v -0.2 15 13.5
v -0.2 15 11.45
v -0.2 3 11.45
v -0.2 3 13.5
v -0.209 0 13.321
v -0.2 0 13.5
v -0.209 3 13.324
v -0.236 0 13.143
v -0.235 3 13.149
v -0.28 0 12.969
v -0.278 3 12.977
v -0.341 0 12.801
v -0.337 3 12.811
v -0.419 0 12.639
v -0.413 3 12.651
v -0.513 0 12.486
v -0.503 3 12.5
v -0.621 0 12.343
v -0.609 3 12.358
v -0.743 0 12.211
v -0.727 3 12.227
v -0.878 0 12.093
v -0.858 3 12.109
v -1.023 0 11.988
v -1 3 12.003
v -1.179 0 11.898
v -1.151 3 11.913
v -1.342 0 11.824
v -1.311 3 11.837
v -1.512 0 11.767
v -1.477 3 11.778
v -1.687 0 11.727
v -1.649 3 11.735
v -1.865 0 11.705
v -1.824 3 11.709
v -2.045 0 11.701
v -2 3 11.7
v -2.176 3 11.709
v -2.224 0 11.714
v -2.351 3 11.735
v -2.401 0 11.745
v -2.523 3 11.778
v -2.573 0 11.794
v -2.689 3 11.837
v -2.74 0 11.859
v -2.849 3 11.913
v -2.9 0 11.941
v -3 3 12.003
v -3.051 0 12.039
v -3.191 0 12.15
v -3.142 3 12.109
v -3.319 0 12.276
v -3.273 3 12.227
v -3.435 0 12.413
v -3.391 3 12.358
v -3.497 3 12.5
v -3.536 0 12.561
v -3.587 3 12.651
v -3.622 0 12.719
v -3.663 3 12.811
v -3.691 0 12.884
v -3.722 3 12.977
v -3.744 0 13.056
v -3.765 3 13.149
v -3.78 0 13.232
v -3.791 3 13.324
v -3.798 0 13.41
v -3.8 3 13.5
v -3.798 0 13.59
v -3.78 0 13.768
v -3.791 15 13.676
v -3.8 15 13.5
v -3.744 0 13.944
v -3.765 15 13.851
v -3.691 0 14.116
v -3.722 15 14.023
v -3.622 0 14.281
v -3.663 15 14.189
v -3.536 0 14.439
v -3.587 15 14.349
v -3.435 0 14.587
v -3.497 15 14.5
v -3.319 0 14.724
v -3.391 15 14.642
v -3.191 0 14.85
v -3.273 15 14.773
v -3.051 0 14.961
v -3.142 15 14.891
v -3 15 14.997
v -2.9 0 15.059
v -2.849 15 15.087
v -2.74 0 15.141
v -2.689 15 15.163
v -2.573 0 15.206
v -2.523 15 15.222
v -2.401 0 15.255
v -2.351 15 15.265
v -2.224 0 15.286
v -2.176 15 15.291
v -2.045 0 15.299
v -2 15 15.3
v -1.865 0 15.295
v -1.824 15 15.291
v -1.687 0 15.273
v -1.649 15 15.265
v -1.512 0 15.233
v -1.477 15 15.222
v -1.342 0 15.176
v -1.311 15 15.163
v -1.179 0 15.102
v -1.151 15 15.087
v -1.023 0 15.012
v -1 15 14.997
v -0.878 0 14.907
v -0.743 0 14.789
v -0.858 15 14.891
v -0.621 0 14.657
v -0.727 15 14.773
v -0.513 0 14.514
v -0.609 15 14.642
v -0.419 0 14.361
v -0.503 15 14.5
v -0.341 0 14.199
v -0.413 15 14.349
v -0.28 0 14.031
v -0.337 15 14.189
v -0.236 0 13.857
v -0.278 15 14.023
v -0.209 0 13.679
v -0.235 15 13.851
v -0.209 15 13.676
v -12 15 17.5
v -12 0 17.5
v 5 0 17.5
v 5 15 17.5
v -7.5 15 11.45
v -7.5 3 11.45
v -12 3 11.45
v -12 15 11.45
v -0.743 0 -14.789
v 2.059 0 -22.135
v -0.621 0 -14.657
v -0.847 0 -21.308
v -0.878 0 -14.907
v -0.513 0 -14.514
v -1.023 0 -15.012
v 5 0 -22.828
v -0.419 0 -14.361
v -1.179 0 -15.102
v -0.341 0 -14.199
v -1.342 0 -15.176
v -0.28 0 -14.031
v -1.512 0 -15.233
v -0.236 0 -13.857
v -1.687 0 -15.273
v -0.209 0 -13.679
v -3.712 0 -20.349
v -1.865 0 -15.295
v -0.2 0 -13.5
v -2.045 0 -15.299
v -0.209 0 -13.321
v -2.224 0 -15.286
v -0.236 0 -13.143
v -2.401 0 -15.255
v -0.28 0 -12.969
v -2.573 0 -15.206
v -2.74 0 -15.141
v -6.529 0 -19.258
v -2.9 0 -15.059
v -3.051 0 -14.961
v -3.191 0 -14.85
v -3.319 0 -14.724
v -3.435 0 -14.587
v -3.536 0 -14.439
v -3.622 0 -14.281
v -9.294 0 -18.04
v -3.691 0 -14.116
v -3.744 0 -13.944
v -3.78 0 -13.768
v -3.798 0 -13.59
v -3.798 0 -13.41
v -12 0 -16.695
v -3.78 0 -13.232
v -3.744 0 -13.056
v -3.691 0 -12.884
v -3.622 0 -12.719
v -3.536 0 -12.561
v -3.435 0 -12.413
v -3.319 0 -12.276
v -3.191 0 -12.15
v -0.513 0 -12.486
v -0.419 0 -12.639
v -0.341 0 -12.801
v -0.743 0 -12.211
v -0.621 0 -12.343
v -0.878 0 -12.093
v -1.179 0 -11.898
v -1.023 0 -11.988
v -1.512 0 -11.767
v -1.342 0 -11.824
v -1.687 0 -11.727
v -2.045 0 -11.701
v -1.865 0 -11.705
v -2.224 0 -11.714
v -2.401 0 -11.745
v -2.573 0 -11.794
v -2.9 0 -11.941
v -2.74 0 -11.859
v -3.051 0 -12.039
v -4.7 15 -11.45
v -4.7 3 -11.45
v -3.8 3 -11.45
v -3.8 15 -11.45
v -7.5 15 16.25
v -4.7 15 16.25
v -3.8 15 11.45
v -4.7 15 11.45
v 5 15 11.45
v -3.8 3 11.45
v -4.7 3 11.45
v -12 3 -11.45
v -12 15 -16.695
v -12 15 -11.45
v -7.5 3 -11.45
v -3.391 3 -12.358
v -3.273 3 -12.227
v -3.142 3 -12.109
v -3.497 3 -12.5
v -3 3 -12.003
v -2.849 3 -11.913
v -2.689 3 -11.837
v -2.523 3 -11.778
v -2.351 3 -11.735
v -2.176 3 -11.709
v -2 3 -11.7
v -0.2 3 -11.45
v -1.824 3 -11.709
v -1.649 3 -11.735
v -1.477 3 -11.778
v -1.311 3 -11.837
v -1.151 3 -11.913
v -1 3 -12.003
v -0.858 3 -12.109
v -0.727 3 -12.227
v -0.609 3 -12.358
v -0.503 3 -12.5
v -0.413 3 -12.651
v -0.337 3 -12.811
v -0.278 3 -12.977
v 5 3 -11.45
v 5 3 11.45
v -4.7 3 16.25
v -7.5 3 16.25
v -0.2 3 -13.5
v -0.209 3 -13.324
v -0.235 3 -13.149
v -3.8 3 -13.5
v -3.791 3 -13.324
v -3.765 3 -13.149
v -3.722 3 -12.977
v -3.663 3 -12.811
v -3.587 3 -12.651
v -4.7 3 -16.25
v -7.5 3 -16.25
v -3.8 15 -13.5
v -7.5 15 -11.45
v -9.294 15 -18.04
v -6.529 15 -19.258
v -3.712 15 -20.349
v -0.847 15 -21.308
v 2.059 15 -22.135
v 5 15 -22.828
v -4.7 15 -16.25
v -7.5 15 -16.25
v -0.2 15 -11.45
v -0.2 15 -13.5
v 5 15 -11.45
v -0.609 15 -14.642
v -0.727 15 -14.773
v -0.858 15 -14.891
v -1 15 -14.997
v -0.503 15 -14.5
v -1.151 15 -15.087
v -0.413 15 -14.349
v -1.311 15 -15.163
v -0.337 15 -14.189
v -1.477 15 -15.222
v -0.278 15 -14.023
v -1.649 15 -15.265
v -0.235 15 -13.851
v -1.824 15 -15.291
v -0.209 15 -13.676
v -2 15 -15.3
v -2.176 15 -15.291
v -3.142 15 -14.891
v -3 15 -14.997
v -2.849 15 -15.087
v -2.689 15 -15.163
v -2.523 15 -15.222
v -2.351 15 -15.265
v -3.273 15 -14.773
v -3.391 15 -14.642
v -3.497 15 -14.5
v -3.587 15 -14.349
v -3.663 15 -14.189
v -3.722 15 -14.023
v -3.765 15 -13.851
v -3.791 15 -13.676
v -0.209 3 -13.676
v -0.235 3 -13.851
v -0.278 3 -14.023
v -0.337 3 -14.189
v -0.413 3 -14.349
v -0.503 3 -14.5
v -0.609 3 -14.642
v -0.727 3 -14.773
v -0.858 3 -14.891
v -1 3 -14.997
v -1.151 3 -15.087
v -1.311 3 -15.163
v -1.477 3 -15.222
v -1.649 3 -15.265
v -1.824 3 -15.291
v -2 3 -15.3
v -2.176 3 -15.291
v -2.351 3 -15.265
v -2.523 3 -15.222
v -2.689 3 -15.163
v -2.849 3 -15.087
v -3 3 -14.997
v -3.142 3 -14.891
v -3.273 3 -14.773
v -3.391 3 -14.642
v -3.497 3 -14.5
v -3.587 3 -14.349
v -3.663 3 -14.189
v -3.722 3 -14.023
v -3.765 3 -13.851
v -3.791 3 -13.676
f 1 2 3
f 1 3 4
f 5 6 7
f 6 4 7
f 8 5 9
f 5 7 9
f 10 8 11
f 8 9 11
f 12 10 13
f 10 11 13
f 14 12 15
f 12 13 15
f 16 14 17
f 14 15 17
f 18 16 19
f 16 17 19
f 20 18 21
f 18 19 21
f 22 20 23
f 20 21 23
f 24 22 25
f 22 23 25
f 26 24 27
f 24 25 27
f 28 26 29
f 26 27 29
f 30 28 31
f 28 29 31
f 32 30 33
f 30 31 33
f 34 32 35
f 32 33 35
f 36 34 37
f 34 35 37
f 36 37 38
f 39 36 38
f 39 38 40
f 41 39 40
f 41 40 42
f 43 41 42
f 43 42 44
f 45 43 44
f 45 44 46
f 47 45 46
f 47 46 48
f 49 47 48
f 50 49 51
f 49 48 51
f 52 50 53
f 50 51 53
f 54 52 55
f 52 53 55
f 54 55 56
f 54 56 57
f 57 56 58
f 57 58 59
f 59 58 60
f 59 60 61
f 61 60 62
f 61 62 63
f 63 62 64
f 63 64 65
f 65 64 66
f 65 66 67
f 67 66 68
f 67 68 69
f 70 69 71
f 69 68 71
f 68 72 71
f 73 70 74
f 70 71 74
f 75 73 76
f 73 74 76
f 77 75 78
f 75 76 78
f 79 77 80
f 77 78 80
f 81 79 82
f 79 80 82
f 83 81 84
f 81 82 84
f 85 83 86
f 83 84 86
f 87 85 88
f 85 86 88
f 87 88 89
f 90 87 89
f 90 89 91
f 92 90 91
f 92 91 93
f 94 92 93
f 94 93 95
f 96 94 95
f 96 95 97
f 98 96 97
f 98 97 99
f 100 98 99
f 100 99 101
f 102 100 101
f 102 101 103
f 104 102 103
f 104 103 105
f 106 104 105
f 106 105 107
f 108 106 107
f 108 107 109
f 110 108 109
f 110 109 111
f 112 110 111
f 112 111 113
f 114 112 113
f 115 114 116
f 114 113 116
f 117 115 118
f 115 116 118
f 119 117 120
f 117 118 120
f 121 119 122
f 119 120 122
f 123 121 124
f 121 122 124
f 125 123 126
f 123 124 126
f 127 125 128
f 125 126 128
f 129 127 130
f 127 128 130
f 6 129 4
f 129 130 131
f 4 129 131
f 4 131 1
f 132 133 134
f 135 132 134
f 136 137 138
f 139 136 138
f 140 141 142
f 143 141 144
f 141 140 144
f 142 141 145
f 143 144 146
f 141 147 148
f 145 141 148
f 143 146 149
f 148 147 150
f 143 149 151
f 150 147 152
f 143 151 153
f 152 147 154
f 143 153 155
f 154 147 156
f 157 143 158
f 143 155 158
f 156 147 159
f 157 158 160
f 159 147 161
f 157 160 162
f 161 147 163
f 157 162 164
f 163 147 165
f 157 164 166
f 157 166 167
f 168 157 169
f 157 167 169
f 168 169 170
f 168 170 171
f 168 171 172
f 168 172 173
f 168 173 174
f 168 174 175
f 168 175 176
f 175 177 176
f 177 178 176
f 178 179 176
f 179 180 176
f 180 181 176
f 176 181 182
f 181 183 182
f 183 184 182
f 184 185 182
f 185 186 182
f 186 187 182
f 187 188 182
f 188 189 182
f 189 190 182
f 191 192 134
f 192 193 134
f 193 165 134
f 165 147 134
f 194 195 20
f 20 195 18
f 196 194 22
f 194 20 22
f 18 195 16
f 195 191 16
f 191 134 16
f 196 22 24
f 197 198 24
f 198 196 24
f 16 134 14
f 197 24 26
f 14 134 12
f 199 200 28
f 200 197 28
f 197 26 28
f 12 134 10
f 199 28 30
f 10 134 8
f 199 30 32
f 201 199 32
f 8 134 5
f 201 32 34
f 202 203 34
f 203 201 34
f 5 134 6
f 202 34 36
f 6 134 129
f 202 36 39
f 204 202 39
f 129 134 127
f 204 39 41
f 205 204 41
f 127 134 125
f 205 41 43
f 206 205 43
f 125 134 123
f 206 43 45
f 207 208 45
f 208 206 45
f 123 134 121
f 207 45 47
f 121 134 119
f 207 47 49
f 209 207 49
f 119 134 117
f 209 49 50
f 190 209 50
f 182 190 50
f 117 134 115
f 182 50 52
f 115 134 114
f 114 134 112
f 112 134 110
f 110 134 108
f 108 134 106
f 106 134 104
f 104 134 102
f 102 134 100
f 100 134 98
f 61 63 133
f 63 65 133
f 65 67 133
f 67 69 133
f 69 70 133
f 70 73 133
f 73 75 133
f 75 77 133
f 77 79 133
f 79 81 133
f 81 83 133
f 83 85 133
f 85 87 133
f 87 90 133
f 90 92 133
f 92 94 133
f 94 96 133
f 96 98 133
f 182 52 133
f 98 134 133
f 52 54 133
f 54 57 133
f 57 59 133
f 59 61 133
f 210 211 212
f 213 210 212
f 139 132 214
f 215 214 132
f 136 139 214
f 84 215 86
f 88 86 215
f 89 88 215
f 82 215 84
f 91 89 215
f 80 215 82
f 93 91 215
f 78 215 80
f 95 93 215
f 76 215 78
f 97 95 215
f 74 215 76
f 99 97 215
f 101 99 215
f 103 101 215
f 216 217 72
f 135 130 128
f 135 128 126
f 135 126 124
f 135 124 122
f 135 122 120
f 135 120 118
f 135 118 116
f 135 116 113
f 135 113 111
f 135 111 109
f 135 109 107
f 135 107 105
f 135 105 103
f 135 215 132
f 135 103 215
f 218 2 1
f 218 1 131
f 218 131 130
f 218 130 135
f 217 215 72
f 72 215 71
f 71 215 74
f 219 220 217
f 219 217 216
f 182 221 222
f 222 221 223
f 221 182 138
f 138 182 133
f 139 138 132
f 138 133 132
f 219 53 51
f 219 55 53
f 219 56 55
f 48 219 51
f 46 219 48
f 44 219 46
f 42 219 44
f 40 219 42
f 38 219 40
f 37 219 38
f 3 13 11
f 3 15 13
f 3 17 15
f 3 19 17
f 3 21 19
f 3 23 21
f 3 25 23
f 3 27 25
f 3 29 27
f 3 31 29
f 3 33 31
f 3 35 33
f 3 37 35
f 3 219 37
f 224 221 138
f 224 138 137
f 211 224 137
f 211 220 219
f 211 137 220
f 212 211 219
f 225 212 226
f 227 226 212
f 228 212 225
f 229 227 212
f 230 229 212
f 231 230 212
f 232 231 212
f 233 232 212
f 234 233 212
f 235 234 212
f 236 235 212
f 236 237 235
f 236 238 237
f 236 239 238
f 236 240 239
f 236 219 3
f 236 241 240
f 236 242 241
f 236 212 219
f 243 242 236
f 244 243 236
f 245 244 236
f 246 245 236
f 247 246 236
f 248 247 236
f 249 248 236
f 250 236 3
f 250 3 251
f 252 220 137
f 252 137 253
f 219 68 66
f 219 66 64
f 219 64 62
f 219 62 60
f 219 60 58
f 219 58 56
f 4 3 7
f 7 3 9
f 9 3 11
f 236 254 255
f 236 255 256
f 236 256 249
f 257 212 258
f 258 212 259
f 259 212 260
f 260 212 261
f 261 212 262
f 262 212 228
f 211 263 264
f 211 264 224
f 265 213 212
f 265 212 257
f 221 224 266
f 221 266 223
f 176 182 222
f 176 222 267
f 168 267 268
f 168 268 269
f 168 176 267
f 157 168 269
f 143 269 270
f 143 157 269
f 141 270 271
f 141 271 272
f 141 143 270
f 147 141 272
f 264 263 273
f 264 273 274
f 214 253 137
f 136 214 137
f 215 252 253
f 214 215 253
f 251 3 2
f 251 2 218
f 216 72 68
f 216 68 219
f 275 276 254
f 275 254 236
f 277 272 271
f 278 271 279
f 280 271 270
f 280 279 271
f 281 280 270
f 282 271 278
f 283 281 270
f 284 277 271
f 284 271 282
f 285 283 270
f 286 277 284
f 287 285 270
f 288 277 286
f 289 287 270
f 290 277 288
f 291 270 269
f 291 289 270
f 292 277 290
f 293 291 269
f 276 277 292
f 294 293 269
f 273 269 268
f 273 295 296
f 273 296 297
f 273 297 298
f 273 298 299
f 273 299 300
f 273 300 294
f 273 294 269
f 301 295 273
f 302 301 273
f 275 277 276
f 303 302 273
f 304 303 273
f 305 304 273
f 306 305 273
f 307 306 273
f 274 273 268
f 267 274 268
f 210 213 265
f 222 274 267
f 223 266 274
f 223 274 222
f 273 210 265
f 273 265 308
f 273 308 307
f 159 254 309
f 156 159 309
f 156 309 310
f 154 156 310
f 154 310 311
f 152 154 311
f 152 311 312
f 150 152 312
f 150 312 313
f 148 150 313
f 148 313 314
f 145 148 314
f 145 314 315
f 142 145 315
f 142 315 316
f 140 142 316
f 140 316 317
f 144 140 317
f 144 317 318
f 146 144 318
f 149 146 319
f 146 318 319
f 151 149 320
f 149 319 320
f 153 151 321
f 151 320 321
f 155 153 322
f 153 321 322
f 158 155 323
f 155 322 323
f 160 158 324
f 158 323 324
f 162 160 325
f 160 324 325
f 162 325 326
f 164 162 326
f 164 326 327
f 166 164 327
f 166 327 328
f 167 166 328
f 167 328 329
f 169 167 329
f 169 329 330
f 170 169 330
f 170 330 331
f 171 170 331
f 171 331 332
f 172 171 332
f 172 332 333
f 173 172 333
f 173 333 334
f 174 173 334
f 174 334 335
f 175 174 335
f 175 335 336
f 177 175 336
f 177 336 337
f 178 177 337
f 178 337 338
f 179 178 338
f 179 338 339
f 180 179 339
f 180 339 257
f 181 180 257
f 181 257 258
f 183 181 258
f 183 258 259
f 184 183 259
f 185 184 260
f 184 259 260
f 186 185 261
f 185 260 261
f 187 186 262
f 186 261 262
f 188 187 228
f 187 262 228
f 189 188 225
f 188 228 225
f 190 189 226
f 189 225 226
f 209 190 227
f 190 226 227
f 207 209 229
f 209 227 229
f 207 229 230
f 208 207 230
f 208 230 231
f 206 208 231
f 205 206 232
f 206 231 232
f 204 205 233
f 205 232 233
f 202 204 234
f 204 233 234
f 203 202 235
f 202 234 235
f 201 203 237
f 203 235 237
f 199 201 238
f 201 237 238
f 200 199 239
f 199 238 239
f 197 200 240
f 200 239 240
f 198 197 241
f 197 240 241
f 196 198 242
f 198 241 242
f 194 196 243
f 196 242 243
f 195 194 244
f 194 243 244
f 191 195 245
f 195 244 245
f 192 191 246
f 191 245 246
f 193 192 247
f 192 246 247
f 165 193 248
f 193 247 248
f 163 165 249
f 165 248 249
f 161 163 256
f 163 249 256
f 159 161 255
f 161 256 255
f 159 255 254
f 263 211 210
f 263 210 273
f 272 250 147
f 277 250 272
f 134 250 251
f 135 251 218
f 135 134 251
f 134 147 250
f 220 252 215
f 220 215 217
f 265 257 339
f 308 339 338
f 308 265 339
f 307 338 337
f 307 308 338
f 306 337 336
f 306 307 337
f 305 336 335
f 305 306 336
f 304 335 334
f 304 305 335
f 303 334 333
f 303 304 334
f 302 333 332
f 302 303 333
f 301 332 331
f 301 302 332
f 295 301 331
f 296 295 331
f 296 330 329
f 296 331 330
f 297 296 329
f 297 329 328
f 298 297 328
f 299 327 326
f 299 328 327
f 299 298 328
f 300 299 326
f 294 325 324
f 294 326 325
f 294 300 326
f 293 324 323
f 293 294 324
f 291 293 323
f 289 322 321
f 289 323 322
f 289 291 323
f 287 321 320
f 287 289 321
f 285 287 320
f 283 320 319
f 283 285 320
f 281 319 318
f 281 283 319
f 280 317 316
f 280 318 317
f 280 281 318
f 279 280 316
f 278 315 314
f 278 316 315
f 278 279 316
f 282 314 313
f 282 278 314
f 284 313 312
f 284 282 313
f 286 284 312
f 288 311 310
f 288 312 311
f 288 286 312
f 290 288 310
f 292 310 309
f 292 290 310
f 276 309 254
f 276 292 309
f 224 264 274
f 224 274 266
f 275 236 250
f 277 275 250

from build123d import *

# Parameters (mm, degrees)
SKETCH1_W            = 17
SKETCH1_H            = 35
BOSS_EXTRUDE1_DEPTH  = 3
M3_CLEARANCE_HOLE1_D = 3.6
SKETCH5_W            = 9.7
SKETCH5_H            = 6.05
BOSS_EXTRUDE2_DEPTH  = 12
CUT_EXTRUDE1_DEPTH   = 12
BOSS_EXTRUDE3_DEPTH  = 12
SKETCH8_W            = 17
SKETCH8_H            = 15
BOSS_EXTRUDE4_DEPTH  = 30
CUT_EXTRUDE2_START   = -15
CUT_EXTRUDE2_DEPTH   = 15


# Read off the part's stored shape, not the designer's step: Cut-Extrude2
with BuildPart() as part:
    # Sketch1 → Boss-Extrude1 (new body)
    with BuildSketch(Plane(origin=(0, 0, 0), x_dir=(1, 0, 0), z_dir=(0, 1, 0))):
        with Locations((-3.5, 0)):
            Rectangle(SKETCH1_W, SKETCH1_H)
    extrude(amount=BOSS_EXTRUDE1_DEPTH)

    # M3 Clearance Hole1 (through all)
    with Locations(Plane(origin=(0, 0, 0), x_dir=(-1, 0, 0), z_dir=(0, -1, 0))):
        with Locations((2, 13.5), (2, -13.5)):
            Hole(M3_CLEARANCE_HOLE1_D / 2)

    # Sketch5 → Boss-Extrude2 (add)
    with BuildSketch(Plane(origin=(0, 3, 0), x_dir=(1, 0, 0), z_dir=(0, 1, 0))):
        with Locations((0.15, -14.475)):
            Rectangle(SKETCH5_W, SKETCH5_H)
        with Locations((0.15, 14.475)):
            Rectangle(SKETCH5_W, SKETCH5_H)
    extrude(amount=BOSS_EXTRUDE2_DEPTH)

    # Sketch6 → Cut-Extrude1 (cut)
    with BuildSketch(Plane(origin=(0, 15, 0), x_dir=(1, 0, 0), z_dir=(0, 1, 0))):
        with BuildLine():
            Line((-3.8, -13.5), (-3.8, 13.5))
            ThreePointArc((-3.8, 13.5), (-2, 15.3), (-0.2, 13.5))
            Line((-0.2, 13.5), (-0.2, -13.5))
            ThreePointArc((-0.2, -13.5), (-2, -15.3), (-3.8, -13.5))
        make_face()
    extrude(amount=-CUT_EXTRUDE1_DEPTH, mode=Mode.SUBTRACT)

    # Sketch7 → Boss-Extrude3 (add)
    with BuildSketch(Plane(origin=(0, 3, 0), x_dir=(1, 0, 0), z_dir=(0, 1, 0))):
        Polygon((-12, -17.5), (-4.7, -17.5), (-4.7, -16.25), (-7.5, -16.25), (-7.5, -11.45), (-12, -11.45), align=None)
        Polygon((-12, 17.5), (-4.7, 17.5), (-4.7, 16.25), (-7.5, 16.25), (-7.5, 11.45), (-12, 11.45), align=None)
    extrude(amount=BOSS_EXTRUDE3_DEPTH)

    # Sketch8 → Boss-Extrude4 (add)
    with BuildSketch(Plane(origin=(0, 0, -17.5), x_dir=(-1, 0, 0), z_dir=(0, 0, -1))):
        with Locations((3.5, 7.5)):
            Rectangle(SKETCH8_W, SKETCH8_H)
    extrude(amount=BOSS_EXTRUDE4_DEPTH)

    # Cut-Extrude2 outline → Cut-Extrude2 (cut)
    with BuildSketch(Plane(origin=(0, 15, 0), x_dir=(1, 0, 0), z_dir=(0, 1, 0)).offset(CUT_EXTRUDE2_START)):
        with BuildLine():
            ThreePointArc((-12, 16.695382119), (-3.71171241, 20.348605395), (5, 22.828084846))
            Line((5, 22.828084846), (5, 47.5))
            Line((5, 47.5), (-12, 47.5))
            Line((-12, 47.5), (-12, 16.695382119))
        make_face()
    extrude(amount=CUT_EXTRUDE2_DEPTH, mode=Mode.SUBTRACT)


solid = part.part
